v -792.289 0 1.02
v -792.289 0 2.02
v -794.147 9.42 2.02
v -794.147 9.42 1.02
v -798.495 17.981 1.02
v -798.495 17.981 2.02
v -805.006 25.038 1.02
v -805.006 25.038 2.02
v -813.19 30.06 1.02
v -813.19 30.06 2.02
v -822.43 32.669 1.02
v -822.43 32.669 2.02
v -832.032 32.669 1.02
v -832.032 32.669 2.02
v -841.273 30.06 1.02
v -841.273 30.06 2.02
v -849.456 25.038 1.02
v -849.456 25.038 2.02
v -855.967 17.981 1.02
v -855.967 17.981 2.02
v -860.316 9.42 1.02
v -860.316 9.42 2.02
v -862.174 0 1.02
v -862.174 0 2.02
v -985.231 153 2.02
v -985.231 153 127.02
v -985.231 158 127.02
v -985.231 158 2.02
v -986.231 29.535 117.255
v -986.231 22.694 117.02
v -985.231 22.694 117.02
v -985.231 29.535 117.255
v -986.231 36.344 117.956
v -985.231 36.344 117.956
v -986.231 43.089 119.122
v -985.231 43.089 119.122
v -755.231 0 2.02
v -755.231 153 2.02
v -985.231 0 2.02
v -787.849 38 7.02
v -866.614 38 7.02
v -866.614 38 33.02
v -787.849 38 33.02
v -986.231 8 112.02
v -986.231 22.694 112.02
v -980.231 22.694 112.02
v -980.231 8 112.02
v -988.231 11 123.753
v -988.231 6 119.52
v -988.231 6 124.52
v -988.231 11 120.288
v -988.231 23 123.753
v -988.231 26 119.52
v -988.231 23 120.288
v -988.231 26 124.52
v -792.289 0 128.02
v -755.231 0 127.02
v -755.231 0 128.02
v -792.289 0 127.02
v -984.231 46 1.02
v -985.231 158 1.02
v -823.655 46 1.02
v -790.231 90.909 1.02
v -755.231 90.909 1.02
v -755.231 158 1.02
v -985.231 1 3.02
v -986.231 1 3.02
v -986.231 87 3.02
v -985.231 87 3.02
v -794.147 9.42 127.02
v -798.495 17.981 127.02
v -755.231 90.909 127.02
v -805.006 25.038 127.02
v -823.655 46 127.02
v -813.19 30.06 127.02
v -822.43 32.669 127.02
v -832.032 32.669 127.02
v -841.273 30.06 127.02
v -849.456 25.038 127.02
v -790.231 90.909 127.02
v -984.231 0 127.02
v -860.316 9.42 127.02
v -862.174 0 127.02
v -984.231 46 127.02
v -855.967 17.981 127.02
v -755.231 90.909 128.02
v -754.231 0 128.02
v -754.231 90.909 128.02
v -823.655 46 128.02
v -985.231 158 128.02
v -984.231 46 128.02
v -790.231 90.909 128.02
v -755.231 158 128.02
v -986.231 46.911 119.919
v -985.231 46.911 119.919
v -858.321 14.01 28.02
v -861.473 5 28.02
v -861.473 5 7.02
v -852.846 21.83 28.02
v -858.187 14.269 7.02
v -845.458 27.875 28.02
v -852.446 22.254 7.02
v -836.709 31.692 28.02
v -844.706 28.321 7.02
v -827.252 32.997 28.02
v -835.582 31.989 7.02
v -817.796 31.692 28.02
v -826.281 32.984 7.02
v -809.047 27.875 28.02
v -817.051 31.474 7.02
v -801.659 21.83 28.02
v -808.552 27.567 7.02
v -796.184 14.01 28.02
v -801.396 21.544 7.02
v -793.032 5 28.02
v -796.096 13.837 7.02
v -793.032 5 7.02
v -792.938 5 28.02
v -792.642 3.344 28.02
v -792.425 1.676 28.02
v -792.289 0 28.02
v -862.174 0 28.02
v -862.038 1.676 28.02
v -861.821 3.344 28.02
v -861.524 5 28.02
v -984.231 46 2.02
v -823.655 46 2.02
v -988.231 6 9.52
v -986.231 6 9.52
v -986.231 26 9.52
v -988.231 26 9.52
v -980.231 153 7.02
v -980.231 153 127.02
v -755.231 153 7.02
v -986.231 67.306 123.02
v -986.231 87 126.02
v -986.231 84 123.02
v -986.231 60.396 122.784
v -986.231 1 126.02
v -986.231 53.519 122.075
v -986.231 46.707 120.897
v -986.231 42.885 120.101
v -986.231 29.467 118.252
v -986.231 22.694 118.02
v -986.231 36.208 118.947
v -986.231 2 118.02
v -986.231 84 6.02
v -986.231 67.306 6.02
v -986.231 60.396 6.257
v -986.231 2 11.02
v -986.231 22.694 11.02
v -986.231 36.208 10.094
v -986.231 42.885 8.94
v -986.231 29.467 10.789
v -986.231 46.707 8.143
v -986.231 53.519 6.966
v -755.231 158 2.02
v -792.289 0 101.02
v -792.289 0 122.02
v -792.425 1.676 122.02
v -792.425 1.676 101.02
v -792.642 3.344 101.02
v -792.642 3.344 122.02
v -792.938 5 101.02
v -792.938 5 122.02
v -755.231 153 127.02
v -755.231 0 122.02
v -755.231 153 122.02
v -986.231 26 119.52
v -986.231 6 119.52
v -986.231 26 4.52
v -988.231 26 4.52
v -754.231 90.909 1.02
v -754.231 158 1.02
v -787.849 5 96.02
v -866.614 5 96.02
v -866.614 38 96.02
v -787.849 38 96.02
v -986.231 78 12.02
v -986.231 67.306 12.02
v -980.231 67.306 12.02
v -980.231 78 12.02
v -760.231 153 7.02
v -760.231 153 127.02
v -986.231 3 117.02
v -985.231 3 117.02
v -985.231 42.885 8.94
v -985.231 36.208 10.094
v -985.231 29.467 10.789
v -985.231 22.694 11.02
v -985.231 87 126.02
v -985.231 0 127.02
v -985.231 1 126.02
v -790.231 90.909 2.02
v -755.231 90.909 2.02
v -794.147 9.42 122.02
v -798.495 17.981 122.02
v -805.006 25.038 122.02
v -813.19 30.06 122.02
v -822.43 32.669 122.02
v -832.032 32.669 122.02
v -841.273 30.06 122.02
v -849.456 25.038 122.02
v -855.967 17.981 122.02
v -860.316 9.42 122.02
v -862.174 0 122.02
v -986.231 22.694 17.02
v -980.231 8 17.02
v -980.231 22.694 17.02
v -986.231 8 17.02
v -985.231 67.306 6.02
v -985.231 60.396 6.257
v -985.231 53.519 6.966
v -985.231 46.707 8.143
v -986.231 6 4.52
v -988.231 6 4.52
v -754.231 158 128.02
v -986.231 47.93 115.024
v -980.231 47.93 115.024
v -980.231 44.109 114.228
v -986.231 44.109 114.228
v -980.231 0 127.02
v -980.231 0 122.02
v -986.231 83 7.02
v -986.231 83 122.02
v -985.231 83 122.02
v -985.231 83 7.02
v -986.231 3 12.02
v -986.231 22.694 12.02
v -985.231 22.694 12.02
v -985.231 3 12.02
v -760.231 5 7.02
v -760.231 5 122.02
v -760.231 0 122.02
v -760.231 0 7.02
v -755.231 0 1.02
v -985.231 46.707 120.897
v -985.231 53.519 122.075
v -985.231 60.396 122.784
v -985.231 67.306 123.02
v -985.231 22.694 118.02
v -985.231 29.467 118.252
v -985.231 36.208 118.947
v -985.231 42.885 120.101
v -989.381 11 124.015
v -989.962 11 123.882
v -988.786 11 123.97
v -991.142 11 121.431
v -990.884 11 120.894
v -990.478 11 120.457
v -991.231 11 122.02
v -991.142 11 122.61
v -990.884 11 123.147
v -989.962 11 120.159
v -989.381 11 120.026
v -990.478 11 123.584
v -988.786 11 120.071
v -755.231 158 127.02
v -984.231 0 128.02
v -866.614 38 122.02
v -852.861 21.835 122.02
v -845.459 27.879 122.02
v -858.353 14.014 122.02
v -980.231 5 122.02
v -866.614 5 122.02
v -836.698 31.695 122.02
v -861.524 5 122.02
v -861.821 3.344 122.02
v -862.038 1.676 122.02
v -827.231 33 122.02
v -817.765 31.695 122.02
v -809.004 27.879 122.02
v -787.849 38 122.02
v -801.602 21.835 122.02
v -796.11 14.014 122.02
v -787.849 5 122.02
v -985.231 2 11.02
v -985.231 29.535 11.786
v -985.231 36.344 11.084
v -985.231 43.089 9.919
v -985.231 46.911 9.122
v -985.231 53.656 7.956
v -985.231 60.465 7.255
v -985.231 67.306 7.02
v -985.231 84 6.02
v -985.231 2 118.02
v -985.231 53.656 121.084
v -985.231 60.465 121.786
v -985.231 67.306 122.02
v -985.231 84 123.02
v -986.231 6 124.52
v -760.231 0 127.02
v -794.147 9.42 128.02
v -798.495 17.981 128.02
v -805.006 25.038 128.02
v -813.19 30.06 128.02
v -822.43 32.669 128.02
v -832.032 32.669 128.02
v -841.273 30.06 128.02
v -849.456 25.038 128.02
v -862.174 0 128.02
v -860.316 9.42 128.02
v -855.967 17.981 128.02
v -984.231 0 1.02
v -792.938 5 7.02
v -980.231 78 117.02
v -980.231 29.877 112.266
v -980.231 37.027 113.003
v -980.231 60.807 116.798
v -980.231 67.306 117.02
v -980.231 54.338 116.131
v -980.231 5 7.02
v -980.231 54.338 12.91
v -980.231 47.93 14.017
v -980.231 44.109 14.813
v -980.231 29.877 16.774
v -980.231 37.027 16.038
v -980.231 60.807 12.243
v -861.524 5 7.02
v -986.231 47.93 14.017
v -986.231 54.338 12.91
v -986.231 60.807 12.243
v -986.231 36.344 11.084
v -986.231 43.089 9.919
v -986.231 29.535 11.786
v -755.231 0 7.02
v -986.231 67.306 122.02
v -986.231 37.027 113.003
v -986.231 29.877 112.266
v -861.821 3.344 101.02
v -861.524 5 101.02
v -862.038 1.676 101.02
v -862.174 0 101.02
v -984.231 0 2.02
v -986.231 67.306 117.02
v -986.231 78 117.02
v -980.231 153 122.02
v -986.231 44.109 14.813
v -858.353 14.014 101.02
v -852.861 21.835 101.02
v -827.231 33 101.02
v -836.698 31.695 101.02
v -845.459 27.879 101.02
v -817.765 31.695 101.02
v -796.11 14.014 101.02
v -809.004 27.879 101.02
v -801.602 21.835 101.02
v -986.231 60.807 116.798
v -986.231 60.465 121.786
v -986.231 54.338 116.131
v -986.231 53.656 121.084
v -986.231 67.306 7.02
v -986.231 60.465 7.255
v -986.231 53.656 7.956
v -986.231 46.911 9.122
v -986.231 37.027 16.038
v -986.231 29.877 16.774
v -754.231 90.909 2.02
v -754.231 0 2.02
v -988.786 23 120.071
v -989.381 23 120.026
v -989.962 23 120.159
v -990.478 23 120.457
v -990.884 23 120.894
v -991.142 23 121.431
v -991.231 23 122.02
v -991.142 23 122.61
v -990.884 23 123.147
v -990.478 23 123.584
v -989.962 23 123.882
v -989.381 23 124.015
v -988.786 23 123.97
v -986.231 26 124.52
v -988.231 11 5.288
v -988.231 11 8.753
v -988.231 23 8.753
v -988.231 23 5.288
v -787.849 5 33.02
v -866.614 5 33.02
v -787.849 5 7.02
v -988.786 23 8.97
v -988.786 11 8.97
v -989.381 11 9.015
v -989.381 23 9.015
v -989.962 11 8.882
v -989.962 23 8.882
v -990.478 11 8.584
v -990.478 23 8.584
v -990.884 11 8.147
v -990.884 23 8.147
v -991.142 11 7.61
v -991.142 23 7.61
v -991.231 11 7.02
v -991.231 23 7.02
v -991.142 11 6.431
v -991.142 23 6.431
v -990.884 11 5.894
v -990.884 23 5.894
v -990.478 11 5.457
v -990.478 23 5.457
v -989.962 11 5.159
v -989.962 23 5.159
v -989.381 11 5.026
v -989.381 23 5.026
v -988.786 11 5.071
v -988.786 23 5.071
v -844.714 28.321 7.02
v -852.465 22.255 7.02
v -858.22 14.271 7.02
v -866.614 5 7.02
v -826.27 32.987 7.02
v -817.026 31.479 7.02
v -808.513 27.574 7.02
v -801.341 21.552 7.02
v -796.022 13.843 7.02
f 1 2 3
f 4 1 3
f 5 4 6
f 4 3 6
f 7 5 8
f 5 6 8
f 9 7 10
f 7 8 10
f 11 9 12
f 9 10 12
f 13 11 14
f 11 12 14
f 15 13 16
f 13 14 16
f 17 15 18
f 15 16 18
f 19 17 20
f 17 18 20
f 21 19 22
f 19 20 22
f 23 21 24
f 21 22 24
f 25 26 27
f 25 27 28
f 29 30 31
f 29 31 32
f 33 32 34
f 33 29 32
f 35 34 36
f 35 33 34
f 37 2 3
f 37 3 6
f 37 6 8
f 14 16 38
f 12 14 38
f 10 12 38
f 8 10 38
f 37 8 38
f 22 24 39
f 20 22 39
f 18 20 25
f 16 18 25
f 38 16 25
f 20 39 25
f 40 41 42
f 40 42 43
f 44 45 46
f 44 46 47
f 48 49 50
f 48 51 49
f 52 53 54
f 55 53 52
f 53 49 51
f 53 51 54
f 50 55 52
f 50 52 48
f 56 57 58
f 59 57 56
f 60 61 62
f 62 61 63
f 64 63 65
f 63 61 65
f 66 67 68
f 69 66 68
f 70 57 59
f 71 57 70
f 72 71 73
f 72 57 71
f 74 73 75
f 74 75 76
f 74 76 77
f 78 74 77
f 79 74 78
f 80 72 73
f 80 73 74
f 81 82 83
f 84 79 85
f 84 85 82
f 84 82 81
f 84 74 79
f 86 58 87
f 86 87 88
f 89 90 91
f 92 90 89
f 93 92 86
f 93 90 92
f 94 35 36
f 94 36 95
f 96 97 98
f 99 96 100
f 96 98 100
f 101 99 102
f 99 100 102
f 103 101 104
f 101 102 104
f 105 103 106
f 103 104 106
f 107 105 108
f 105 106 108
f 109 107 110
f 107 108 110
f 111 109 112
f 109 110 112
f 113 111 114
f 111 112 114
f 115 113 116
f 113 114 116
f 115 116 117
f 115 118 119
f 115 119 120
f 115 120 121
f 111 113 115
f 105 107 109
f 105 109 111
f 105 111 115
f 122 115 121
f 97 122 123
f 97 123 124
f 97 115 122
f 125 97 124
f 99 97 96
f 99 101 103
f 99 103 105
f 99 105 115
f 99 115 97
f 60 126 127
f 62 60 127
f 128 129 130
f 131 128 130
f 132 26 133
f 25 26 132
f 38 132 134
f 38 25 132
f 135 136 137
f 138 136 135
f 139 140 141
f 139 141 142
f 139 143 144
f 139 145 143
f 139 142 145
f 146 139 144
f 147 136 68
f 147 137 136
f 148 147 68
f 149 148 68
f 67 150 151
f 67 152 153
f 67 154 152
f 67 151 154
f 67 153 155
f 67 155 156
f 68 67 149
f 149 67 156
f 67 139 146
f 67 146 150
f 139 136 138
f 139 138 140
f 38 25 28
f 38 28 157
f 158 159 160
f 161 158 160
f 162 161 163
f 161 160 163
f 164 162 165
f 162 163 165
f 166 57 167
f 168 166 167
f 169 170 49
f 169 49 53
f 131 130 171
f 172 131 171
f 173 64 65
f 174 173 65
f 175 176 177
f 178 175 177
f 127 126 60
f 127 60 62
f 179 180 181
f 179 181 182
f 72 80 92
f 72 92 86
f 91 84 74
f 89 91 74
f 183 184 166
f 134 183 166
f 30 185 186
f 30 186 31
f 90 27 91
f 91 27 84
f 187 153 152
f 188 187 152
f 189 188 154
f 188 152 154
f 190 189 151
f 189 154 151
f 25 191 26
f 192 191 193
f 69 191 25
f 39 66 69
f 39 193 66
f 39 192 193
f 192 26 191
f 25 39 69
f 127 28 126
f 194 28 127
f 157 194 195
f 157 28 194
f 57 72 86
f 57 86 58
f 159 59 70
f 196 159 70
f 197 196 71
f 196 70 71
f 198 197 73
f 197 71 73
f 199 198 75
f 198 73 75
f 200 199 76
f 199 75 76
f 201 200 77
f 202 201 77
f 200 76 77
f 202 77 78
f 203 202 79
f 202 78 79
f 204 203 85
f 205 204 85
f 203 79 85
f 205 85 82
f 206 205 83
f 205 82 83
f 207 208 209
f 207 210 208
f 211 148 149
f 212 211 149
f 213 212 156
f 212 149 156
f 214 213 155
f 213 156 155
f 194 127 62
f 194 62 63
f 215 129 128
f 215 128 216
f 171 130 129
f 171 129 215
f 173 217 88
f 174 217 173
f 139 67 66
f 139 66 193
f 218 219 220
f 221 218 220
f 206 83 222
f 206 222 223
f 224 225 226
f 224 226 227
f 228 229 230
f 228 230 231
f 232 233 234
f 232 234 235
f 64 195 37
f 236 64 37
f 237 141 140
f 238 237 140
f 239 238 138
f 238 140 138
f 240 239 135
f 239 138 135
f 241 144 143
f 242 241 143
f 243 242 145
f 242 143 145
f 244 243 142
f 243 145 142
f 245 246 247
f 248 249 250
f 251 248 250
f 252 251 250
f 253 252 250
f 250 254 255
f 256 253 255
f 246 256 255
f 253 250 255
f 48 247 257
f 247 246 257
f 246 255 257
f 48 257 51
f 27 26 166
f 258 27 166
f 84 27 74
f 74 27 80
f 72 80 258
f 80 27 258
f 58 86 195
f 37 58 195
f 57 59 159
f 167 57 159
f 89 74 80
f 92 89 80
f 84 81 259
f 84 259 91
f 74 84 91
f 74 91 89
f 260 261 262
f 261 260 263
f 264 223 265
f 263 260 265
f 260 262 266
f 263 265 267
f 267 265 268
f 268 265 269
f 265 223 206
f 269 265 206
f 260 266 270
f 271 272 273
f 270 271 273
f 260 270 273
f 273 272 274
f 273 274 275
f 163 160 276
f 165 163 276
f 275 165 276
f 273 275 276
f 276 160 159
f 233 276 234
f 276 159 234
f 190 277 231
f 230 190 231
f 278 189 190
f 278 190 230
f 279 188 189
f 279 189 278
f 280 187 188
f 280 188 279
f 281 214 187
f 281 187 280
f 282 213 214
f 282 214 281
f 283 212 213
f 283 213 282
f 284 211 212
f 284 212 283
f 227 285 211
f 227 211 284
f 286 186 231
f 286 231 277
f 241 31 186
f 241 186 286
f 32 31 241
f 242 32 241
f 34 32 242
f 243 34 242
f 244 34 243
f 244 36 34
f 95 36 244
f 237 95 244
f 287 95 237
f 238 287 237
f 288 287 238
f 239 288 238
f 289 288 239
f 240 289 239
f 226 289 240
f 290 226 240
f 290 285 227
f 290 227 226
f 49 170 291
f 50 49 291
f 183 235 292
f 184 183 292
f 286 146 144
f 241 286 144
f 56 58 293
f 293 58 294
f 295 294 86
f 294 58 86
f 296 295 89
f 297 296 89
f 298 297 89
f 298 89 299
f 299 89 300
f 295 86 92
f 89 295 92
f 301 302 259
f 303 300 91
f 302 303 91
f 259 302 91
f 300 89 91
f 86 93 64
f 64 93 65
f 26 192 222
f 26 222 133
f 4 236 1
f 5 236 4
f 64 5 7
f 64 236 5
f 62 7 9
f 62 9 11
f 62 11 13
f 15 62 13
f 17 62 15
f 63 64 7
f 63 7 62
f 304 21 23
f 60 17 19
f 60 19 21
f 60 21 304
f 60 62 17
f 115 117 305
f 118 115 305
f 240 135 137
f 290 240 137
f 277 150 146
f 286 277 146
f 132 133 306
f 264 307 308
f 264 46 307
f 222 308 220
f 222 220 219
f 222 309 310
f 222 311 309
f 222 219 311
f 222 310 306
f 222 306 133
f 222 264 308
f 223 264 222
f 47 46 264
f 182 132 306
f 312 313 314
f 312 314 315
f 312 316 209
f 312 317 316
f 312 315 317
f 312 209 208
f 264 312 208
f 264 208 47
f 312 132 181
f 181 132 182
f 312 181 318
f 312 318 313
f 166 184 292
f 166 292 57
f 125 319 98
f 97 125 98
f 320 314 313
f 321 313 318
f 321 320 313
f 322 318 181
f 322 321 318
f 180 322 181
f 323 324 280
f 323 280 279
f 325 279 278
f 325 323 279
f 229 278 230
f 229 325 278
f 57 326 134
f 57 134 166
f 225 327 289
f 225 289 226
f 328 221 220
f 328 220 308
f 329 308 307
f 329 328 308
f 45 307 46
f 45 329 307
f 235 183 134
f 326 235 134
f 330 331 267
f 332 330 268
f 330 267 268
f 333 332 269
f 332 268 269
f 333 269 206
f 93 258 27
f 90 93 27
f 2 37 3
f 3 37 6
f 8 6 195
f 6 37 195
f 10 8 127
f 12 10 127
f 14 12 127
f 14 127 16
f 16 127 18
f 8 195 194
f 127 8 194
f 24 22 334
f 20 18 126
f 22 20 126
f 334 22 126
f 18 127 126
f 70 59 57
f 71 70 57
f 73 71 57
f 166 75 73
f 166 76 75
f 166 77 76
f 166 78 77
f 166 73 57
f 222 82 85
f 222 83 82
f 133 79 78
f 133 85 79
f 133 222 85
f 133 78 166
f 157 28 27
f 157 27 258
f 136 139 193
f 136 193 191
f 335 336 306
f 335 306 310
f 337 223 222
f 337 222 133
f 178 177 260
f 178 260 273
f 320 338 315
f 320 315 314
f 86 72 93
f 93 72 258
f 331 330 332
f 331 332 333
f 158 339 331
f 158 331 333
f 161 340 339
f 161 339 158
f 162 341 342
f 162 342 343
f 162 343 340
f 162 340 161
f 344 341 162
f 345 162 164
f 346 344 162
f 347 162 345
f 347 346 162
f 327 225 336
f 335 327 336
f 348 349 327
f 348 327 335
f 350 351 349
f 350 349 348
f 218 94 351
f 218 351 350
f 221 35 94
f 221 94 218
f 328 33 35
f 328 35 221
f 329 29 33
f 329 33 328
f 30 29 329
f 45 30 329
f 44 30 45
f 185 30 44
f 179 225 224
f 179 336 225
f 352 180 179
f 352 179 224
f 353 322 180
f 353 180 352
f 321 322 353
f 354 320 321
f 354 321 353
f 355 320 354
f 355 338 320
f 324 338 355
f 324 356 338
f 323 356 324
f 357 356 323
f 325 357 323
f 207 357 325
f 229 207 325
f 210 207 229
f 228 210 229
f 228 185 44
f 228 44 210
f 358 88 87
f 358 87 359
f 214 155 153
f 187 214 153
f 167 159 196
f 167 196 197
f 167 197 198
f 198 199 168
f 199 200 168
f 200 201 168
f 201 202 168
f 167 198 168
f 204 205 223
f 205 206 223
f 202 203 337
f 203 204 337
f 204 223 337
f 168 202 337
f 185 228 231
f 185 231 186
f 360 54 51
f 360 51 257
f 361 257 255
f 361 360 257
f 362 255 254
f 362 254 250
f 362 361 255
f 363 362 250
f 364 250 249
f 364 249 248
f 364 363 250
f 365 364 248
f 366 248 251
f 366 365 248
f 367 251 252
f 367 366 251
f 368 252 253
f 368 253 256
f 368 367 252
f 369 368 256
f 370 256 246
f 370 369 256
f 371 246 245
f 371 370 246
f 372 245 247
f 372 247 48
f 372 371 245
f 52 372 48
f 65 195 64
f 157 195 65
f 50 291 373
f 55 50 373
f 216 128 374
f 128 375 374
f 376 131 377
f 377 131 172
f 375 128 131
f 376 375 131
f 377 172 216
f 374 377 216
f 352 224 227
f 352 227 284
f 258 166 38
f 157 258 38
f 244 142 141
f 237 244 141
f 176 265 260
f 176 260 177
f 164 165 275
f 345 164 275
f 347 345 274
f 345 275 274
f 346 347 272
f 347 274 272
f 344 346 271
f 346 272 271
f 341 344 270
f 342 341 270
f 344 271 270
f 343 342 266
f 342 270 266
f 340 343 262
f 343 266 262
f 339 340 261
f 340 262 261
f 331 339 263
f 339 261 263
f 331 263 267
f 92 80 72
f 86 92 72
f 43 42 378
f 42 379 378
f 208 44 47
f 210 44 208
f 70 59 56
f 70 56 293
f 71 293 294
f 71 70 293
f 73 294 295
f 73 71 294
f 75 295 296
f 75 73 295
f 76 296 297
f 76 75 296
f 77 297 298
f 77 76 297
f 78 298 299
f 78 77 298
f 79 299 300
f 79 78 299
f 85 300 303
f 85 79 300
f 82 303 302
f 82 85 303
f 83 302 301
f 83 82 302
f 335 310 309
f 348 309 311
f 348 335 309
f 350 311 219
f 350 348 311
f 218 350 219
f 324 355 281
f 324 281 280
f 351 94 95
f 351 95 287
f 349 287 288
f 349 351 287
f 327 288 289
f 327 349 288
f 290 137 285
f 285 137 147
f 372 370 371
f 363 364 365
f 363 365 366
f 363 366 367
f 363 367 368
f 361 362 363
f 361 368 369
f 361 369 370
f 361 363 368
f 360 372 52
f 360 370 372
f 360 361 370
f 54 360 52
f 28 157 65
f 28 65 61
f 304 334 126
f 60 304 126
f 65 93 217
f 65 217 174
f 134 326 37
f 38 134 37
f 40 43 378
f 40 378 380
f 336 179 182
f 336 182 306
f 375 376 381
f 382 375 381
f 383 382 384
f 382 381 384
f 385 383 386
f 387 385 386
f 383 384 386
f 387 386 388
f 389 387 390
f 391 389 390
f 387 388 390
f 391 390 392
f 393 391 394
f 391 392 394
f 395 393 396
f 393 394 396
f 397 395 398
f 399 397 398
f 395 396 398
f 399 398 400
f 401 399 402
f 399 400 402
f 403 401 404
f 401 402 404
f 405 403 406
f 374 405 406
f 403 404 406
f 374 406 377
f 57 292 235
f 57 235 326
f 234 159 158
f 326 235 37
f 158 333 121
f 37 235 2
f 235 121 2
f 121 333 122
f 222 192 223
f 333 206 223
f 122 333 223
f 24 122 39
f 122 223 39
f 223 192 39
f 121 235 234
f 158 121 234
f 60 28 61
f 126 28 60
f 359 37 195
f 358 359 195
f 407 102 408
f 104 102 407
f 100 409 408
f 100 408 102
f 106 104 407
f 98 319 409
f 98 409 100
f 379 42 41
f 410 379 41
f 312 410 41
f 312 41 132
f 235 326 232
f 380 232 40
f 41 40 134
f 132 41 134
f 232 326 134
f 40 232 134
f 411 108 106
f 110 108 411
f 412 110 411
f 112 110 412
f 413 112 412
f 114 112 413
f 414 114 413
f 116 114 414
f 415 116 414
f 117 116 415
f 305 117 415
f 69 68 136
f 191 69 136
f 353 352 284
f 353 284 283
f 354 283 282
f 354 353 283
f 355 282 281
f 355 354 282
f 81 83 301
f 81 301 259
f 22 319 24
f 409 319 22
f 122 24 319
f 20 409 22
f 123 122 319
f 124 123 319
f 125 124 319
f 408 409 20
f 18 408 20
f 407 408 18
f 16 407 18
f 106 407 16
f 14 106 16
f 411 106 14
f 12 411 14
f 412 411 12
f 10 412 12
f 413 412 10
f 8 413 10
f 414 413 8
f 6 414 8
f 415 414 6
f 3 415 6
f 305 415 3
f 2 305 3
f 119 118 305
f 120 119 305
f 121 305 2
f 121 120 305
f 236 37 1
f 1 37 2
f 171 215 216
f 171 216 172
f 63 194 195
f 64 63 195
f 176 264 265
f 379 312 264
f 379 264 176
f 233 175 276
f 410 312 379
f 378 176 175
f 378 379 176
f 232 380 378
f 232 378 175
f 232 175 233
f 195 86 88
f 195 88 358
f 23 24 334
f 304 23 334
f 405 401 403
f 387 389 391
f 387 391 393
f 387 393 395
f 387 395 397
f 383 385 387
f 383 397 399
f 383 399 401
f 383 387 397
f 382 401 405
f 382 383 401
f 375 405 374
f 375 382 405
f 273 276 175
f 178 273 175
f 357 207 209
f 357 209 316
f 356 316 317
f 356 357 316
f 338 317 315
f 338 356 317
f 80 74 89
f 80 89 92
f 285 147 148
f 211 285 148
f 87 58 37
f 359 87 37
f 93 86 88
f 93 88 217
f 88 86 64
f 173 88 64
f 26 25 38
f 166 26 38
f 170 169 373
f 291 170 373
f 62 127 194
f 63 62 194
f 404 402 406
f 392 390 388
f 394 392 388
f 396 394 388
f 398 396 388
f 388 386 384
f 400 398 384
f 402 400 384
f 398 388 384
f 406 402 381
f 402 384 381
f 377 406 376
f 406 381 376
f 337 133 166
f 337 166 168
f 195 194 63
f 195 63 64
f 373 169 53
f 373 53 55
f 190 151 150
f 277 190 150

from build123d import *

# Parameters (mm, degrees)
SKETCH_1_W                = 229
SKETCH_1_H                = 125
EXTRUDE_1_DEPTH           = 88
SKETCH_4_W                = 125
SKETCH_4_H                = 88
SKETCH_4_W_2              = 123
SKETCH_4_H_2              = 86
CUT_EXTRUDE_3_DEPTH       = 1
SKETCH_5_W                = 125
SKETCH_5_H                = 88
EXTRUDE_2_DEPTH           = 1
SKETCH_11_W               = 5
SKETCH_11_H               = 20
EXTRUDE_3_DEPTH           = 2
SKETCH_12_R               = 2
EXTRUDE_4_DEPTH           = 12
SKETCH_13_R               = 35
CUT_EXTRUDE_7_DEPTH       = 26
CUT_EXTRUDE_START         = -26
SKETCH_14_R               = 35
CUT_EXTRUDE_8_DEPTH       = 26
SKETCH_16_W               = 229
SKETCH_16_H               = 125
EXTRUDE_6_DEPTH           = 70
SHELL_START               = -980.231317195
SHELL_1_OUTLINE_W         = 148
SHELL_1_OUTLINE_H         = 115
SHELL_1_DEPTH             = 113.617262665
SHELL_START_2             = -787.84857986
SHELL_1_2_OUTLINE_W       = 148
SHELL_1_2_OUTLINE_H       = 115
SHELL_1_2_DEPTH           = 31.617262665
SHELL_1_3_OUTLINE_W       = 3
SHELL_1_3_OUTLINE_H       = 63
SHELL_1_3_DEPTH           = 224
SHELL_START_3             = -981.231317195
SHELL_1_4_DEPTH           = 1
SHELL_START_4             = 7.020467364
SHELL_1_5_DEPTH           = 115
SHELL_START_5             = 33.020467364
SHELL_1_6_DEPTH           = 63
CUT_EXTRUDE_START_2       = -70
CUT_EXTRUDE_9_DEPTH       = 70
SKETCH_20_W               = 125
SKETCH_20_H               = 158
SKETCH_20_W_2             = 115
SKETCH_20_H_2             = 148
EXTRUDE_7_DEPTH           = 1
CUT_EXTRUDE_START_3       = -5
CUT_EXTRUDE_14_DEPTH      = 5
EXTRUDE_8_DEPTH           = 5
SKETCH_26_W               = 230
SKETCH_26_H               = 125
CUT_EXTRUDE_15_DEPTH      = 5
SKETCH_27_W               = 230
SKETCH_27_H               = 125
EXTRUDE_9_DEPTH           = 5
SKETCH_28_W               = 5
SKETCH_28_H               = 115
EXTRUDE_10_DEPTH          = 148
EXTRUDE_11_DEPTH          = 1
EXTRUDE_12_DEPTH          = 1
SKETCH_32_W               = 127
SKETCH_32_H               = 67.090624259
EXTRUDE_13_DEPTH          = 1
SKETCH_33_W               = 126
SKETCH_33_H               = 90.909375741
EXTRUDE_14_DEPTH          = 1
CUT_EXTRUDE_16_DEPTH      = 40
CUT_EXTRUDE_16_DEPTH_BACK = 10
SKETCH_34_W               = 225
SKETCH_34_H               = 5
SKETCH_35_W               = 220
SKETCH_35_H               = 153
EXTRUDE_16_DEPTH          = 5
SKETCH_36_W               = 5
SKETCH_36_H               = 153
EXTRUDE_17_DEPTH          = 5
CUT_EXTRUDE_17_DEPTH      = 5
SKETCH_39_W               = 115
SKETCH_39_H               = 5
CUT_EXTRUDE_18_DEPTH      = 5
SKETCH_40_W               = 5
SKETCH_40_H               = 120
EXTRUDE_19_DEPTH          = 153
SKETCH_45_W               = 78.76547467
SKETCH_45_H               = 26
EXTRUDE_21_DEPTH          = 33
CUT_EXTRUDE_20_DEPTH      = 21
SKETCH_48_R               = 34.912032086
CUT_EXTRUDE_21_DEPTH      = 21


with BuildPart() as part:
    # 스케치1 → 보스-돌출1 (new body)
    with BuildSketch(Plane(origin=(0, 0, 0), x_dir=(1, 0, 0), z_dir=(0, 1, 0))):
        with Locations((-871.731317195, -64.520467364)):
            Rectangle(SKETCH_1_W, SKETCH_1_H)
    extrude(amount=EXTRUDE_1_DEPTH)

    # 스케치4 → 컷-돌출3 (cut)
    # profile 1 of 2: a face of its own
    with BuildSketch(Plane.ZY.offset(986.231317195)):
        with Locations((64.520467364, 44)):
            Rectangle(SKETCH_4_W, SKETCH_4_H)
        with Locations((64.520467364, 44)):
            Rectangle(SKETCH_4_W_2, SKETCH_4_H_2, mode=Mode.SUBTRACT)
    # profile 2 of 2: a face of its own
    with BuildSketch(Plane.ZY.offset(986.231317195)):
        with BuildLine():
            Line((6.020467364, 84), (6.020467364, 67.306026885))
            ThreePointArc((6.020467364, 67.306026885), (6.552613646, 56.95178287), (8.143444971, 46.70664722))
            Line((8.143444971, 46.70664722), (8.939528918, 42.885444272))
            ThreePointArc((8.939528918, 42.885444272), (10.498858633, 32.843182595), (11.020467364, 22.693973115))
            Line((11.020467364, 22.693973115), (11.020467364, 2))
            Line((11.020467364, 2), (118.020467364, 2))
            Line((118.020467364, 2), (118.020467364, 22.693973115))
            ThreePointArc((118.020467364, 22.693973115), (118.542076095, 32.843182595), (120.10140581, 42.885444272))
            Line((120.10140581, 42.885444272), (120.897489758, 46.70664722))
            ThreePointArc((120.897489758, 46.70664722), (122.488321083, 56.95178287), (123.020467364, 67.306026885))
            Line((123.020467364, 67.306026885), (123.020467364, 84))
            Line((123.020467364, 84), (6.020467364, 84))
        make_face()
        with BuildLine():
            Line((12.020467364, 22.693973115), (12.020467364, 3))
            Line((12.020467364, 3), (117.020467364, 3))
            Line((117.020467364, 3), (117.020467364, 22.693973115))
            ThreePointArc((117.020467364, 22.693973115), (117.547344871, 32.945699863), (119.122425391, 43.089398526))
            Line((119.122425391, 43.089398526), (119.918509338, 46.910601474))
            ThreePointArc((119.918509338, 46.910601474), (121.493589858, 57.054300137), (122.020467364, 67.306026885))
            Line((122.020467364, 67.306026885), (122.020467364, 83))
            Line((122.020467364, 83), (7.020467364, 83))
            Line((7.020467364, 83), (7.020467364, 67.306026885))
            ThreePointArc((7.020467364, 67.306026885), (7.547344871, 57.054300137), (9.122425391, 46.910601474))
            Line((9.122425391, 46.910601474), (9.918509338, 43.089398526))
            ThreePointArc((9.918509338, 43.089398526), (11.493589858, 32.945699863), (12.020467364, 22.693973115))
        make_face(mode=Mode.SUBTRACT)
    extrude(amount=-CUT_EXTRUDE_3_DEPTH, mode=Mode.SUBTRACT)

    # 스케치5 → 보스-돌출2 (add)
    with BuildSketch(Plane(origin=(-757.231317195, 0, 0), x_dir=(0, 0, -1), z_dir=(1, 0, 0))):
        with Locations((-64.520467364, 44)):
            Rectangle(SKETCH_5_W, SKETCH_5_H)
    extrude(amount=EXTRUDE_2_DEPTH)

    # 스케치13 → 컷-돌출7 (cut)
    with BuildSketch(Plane.XY.offset(127.020467364)):
        with Locations((-827.231317195, -2)):
            Circle(SKETCH_13_R)
    extrude(amount=-CUT_EXTRUDE_7_DEPTH, mode=Mode.SUBTRACT)

    # 스케치14 → 컷-돌출8 (cut)
    with BuildSketch(Plane(origin=(0, 0, 2.020467364), x_dir=(-1, 0, 0), z_dir=(0, 0, -1)).offset(CUT_EXTRUDE_START)):
        with Locations((827.231317195, -2)):
            Circle(SKETCH_14_R)
    extrude(amount=CUT_EXTRUDE_8_DEPTH, mode=Mode.SUBTRACT)

    # 스케치16 → 보스-돌출6 (add)
    with BuildSketch(Plane(origin=(0, 88, 0), x_dir=(1, 0, 0), z_dir=(0, 1, 0))):
        with Locations((-870.731317195, -64.520467364)):
            Rectangle(SKETCH_16_W, SKETCH_16_H)
    extrude(amount=EXTRUDE_6_DEPTH)

    # 쉘1: read off the stored shape, not the designer's step
    # 쉘1 outline → 쉘1 (cut)
    with BuildSketch(Plane.YZ.offset(SHELL_START)):
        with Locations((79, 64.520467364)):
            Rectangle(SHELL_1_OUTLINE_W, SHELL_1_OUTLINE_H)
    extrude(amount=SHELL_1_DEPTH, mode=Mode.SUBTRACT)

    # Shell 1 2 outline → Shell 1 2 (cut)
    with BuildSketch(Plane.YZ.offset(SHELL_START_2)):
        with Locations((79, 64.520467364)):
            Rectangle(SHELL_1_2_OUTLINE_W, SHELL_1_2_OUTLINE_H)
    extrude(amount=SHELL_1_2_DEPTH, mode=Mode.SUBTRACT)

    # Shell 1 3 outline → Shell 1 3 (cut)
    with BuildSketch(Plane.YZ.offset(SHELL_START)):
        with Locations((6.5, 64.520467364)):
            Rectangle(SHELL_1_3_OUTLINE_W, SHELL_1_3_OUTLINE_H)
    extrude(amount=SHELL_1_3_DEPTH, mode=Mode.SUBTRACT)

    # Shell 1 4 outline → Shell 1 4 (cut)
    with BuildSketch(Plane.YZ.offset(SHELL_START_3)):
        with BuildLine():
            Line((8, 96.020467364), (8, 33.020467364))
            Line((8, 33.020467364), (8, 17.020467364))
            Line((8, 17.020467364), (22.693973115, 17.020467364))
            ThreePointArc((22.693973115, 17.020467364), (33.4582862, 16.467245983), (44.109169797, 14.813411437))
            Line((44.109169797, 14.813411437), (47.930372745, 14.017327489))
            ThreePointArc((47.930372745, 14.017327489), (57.566886475, 12.521000995), (67.306026885, 12.020467364))
            Line((67.306026885, 12.020467364), (78, 12.020467364))
            Line((78, 12.020467364), (78, 117.020467364))
            Line((78, 117.020467364), (67.306026885, 117.020467364))
            ThreePointArc((67.306026885, 117.020467364), (57.566886475, 116.519933734), (47.930372745, 115.023607239))
            Line((47.930372745, 115.023607239), (44.109169797, 114.227523292))
            ThreePointArc((44.109169797, 114.227523292), (33.4582862, 112.573688746), (22.693973115, 112.020467364))
            Line((22.693973115, 112.020467364), (8, 112.020467364))
            Line((8, 112.020467364), (8, 96.020467364))
        make_face()
    extrude(amount=SHELL_1_4_DEPTH, mode=Mode.SUBTRACT)

    # Shell 1 5 outline → Shell 1 5 (cut)
    with BuildSketch(Plane.XY.offset(SHELL_START_4)):
        with BuildLine():
            Line((-787.84857986, 5), (-787.84857986, 153))
            Line((-787.84857986, 153), (-866.61405453, 153))
            Line((-866.61405453, 153), (-866.61405453, 5))
            ThreePointArc((-866.61405453, 5), (-827.231317195, 38), (-787.84857986, 5))
        make_face()
    extrude(amount=SHELL_1_5_DEPTH, mode=Mode.SUBTRACT)

    # Shell 1 6 outline → Shell 1 6 (cut)
    with BuildSketch(Plane.XY.offset(SHELL_START_5)):
        with BuildLine():
            Line((-865.961150657, 8), (-788.501483733, 8))
            ThreePointArc((-788.501483733, 8), (-827.231317195, 38), (-865.961150657, 8))
        make_face()
    extrude(amount=SHELL_1_6_DEPTH, mode=Mode.SUBTRACT)

    # 스케치18 → 컷-돌출9 (cut)
    with BuildSketch(Plane(origin=(-981.231317195, 0, 0), x_dir=(0, 0, -1), z_dir=(1, 0, 0)).offset(CUT_EXTRUDE_START_2)):
        with BuildLine():
            Line((-17.020467364, 8), (-17.020467364, 22.693973115))
            ThreePointArc((-17.020467364, 22.693973115), (-16.467245983, 33.4582862), (-14.813411437, 44.109169797))
            Line((-14.813411437, 44.109169797), (-14.017327489, 47.930372745))
            ThreePointArc((-14.017327489, 47.930372745), (-12.521000995, 57.566886475), (-12.020467364, 67.306026885))
            Line((-12.020467364, 67.306026885), (-12.020467364, 78))
            Line((-12.020467364, 78), (-117.020467364, 78))
            Line((-117.020467364, 78), (-117.020467364, 67.306026885))
            ThreePointArc((-117.020467364, 67.306026885), (-116.519933734, 57.566886475), (-115.023607239, 47.930372745))
            Line((-115.023607239, 47.930372745), (-114.227523292, 44.109169797))
            ThreePointArc((-114.227523292, 44.109169797), (-112.573688746, 33.4582862), (-112.020467364, 22.693973115))
            Line((-112.020467364, 22.693973115), (-112.020467364, 8))
            Line((-112.020467364, 8), (-17.020467364, 8))
        make_face()
    extrude(amount=CUT_EXTRUDE_9_DEPTH, mode=Mode.SUBTRACT)

    # 스케치20 → 보스-돌출7 (add)
    with BuildSketch(Plane(origin=(-756.231317195, 0, 0), x_dir=(0, 0, -1), z_dir=(1, 0, 0))):
        with Locations((-64.520467364, 79)):
            Rectangle(SKETCH_20_W, SKETCH_20_H)
        with Locations((-64.520467364, 79)):
            Rectangle(SKETCH_20_W_2, SKETCH_20_H_2, mode=Mode.SUBTRACT)
    extrude(amount=EXTRUDE_7_DEPTH)

    # 스케치24 → 컷-돌출14 (cut)
    with BuildSketch(Plane.XY.offset(127.020467364).offset(CUT_EXTRUDE_START_3)):
        with BuildLine():
            Line((-755.231317195, 153), (-980.231317195, 153))
            Line((-980.231317195, 153), (-980.231317195, 5))
            Line((-980.231317195, 5), (-866.61405453, 5))
            ThreePointArc((-866.61405453, 5), (-827.231317195, 38), (-787.84857986, 5))
            Line((-787.84857986, 5), (-755.231317195, 5))
            Line((-755.231317195, 5), (-755.231317195, 153))
        make_face()
    extrude(amount=CUT_EXTRUDE_14_DEPTH, mode=Mode.SUBTRACT)

    # 스케치26 → 컷-돌출15 (cut)
    with BuildSketch(Plane(origin=(0, 158, 0), x_dir=(1, 0, 0), z_dir=(0, 1, 0))):
        with Locations((-870.231317195, -64.520467364)):
            Rectangle(SKETCH_26_W, SKETCH_26_H)
    extrude(amount=-CUT_EXTRUDE_15_DEPTH, mode=Mode.SUBTRACT)

    # 스케치34 → 컷-돌출16 (cut, two sides: drawn at the far end of the back side and taken through both)
    with BuildSketch(Plane(origin=(0, 5, 0), x_dir=(1, 0, 0), z_dir=(0, 1, 0)).offset(-CUT_EXTRUDE_16_DEPTH_BACK)):
        with Locations((-867.731317195, -124.520467364)):
            Rectangle(SKETCH_34_W, SKETCH_34_H)
    extrude(amount=CUT_EXTRUDE_16_DEPTH + CUT_EXTRUDE_16_DEPTH_BACK, mode=Mode.SUBTRACT)

    # 스케치39 → 컷-돌출18 (cut)
    with BuildSketch(Plane(origin=(-755.231317195, 0, 0), x_dir=(0, 0, -1), z_dir=(1, 0, 0))):
        with Locations((-64.520467364, 2.5)):
            Rectangle(SKETCH_39_W, SKETCH_39_H)
    extrude(amount=-CUT_EXTRUDE_18_DEPTH, mode=Mode.SUBTRACT)

    # 스케치45 → 보스-돌출21 (add)
    with BuildSketch(Plane(origin=(0, 5, 0), x_dir=(1, 0, 0), z_dir=(0, 1, 0))):
        with Locations((-827.231317195, -20.020467364)):
            Rectangle(SKETCH_45_W, SKETCH_45_H)
        with Locations((-827.231317195, -109.020467364)):
            Rectangle(SKETCH_45_W, SKETCH_45_H)
    extrude(amount=EXTRUDE_21_DEPTH)

    # 스케치47 → 컷-돌출20 (cut)
    with BuildSketch(Plane.XY.offset(122.020467364)):
        with BuildLine():
            Line((-862.174127614, 0), (-792.288506775, 0))
            ThreePointArc((-792.288506775, 0), (-827.231317195, 33), (-862.174127614, 0))
        make_face()
    extrude(amount=-CUT_EXTRUDE_20_DEPTH, mode=Mode.SUBTRACT)

    # 스케치48 → 컷-돌출21 (cut)
    with BuildSketch(Plane(origin=(0, 0, 7.020467364), x_dir=(-1, 0, 0), z_dir=(0, 0, -1))):
        with Locations((827.252311569, -1.914574066)):
            Circle(SKETCH_48_R)
    extrude(amount=-CUT_EXTRUDE_21_DEPTH, mode=Mode.SUBTRACT)


with BuildPart() as body_2:
    # 스케치11 → 보스-돌출3 (new body)
    with BuildSketch(Plane.ZY.offset(986.231317195)):
        with Locations((122.020467364, 16)):
            Rectangle(SKETCH_11_W, SKETCH_11_H)
    extrude(amount=EXTRUDE_3_DEPTH)

    # 스케치12 → 보스-돌출4 (add)
    with BuildSketch(Plane(origin=(0, 23, 0), x_dir=(1, 0, 0), z_dir=(0, 1, 0))):
        with Locations((-989.231317195, -122.020467364)):
            Circle(SKETCH_12_R)
    extrude(amount=-EXTRUDE_4_DEPTH)


with BuildPart() as body_3:
    # 대칭 복사1: mirrored copy
    add(body_2.part.mirror(Plane.XY.offset(64.520467364)))


with BuildPart() as body_4:
    # 스케치25 → 보스-돌출8 (new body)
    with BuildSketch(Plane.XY.offset(127.020467364)):
        with BuildLine():
            Line((-980.231317195, 153), (-755.231317195, 153))
            Line((-755.231317195, 153), (-755.231317195, 5))
            Line((-755.231317195, 5), (-787.616277727, 5))
            ThreePointArc((-787.616277727, 5), (-826.999015062, 38), (-866.381752397, 5))
            Line((-866.381752397, 5), (-980.231317195, 5))
            Line((-980.231317195, 5), (-980.231317195, 153))
        make_face()
    extrude(amount=-EXTRUDE_8_DEPTH)


with BuildPart() as body_5:
    # 스케치27 → 보스-돌출9 (new body)
    with BuildSketch(Plane(origin=(0, 153, 0), x_dir=(1, 0, 0), z_dir=(0, 1, 0))):
        with Locations((-870.231317195, -64.520467364)):
            Rectangle(SKETCH_27_W, SKETCH_27_H)
    extrude(amount=EXTRUDE_9_DEPTH)


with BuildPart() as body_6:
    # 스케치28 → 보스-돌출10 (new body)
    with BuildSketch(Plane(origin=(0, 5, 0), x_dir=(1, 0, 0), z_dir=(0, 1, 0))):
        with Locations((-757.731317195, -64.520467364)):
            Rectangle(SKETCH_28_W, SKETCH_28_H)
    extrude(amount=EXTRUDE_10_DEPTH)


with BuildPart() as body_7:
    # 스케치29 → 보스-돌출11 (new body)
    with BuildSketch(Plane(origin=(0, 0, 2.020467364), x_dir=(-1, 0, 0), z_dir=(0, 0, -1))):
        with BuildLine():
            Line((984.231317195, 0), (984.231317195, 46))
            Line((984.231317195, 46), (823.655113572, 46))
            Line((823.655113572, 46), (790.231317195, 90.909375741))
            Line((790.231317195, 90.909375741), (755.231317195, 90.909375741))
            Line((755.231317195, 90.909375741), (755.231317195, 0))
            Line((755.231317195, 0), (792.288506775, 0))
            ThreePointArc((792.288506775, 0), (827.231317195, 33), (862.174127614, 0))
            Line((862.174127614, 0), (984.231317195, 0))
        make_face()
    extrude(amount=EXTRUDE_11_DEPTH)


with BuildPart() as body_8:
    # 스케치30 → 보스-돌출12 (new body)
    with BuildSketch(Plane(origin=(0, 0, 2.020467364), x_dir=(-1, 0, 0), z_dir=(0, 0, -1))):
        Polygon((755.231317195, 90.909375741), (755.231317195, 158), (985.231317195, 158), (984.231317195, 46), (823.655113572, 46), (790.231317195, 90.909375741), align=None)
    extrude(amount=EXTRUDE_12_DEPTH)


with BuildPart() as body_8_2:
    # 대칭 복사3: mirrored copy
    add(body_8.part.mirror(Plane.XY.offset(64.520467364)))


with BuildPart() as body_9:
    # Mirror 3 2: mirrored copy
    add(body_7.part.mirror(Plane.XY.offset(64.520467364)))


with BuildPart() as body_10:
    # 스케치32 → 보스-돌출13 (new body)
    with BuildSketch(Plane(origin=(-755.231317195, 0, 0), x_dir=(0, 0, -1), z_dir=(1, 0, 0))):
        with Locations((-64.520467364, 124.454687871)):
            Rectangle(SKETCH_32_W, SKETCH_32_H)
    extrude(amount=EXTRUDE_13_DEPTH)


with BuildPart() as body_11:
    # 스케치33 → 보스-돌출14 (new body)
    with BuildSketch(Plane(origin=(-755.231317195, 0, 0), x_dir=(0, 0, -1), z_dir=(1, 0, 0))):
        with Locations((-65.020467364, 45.454687871)):
            Rectangle(SKETCH_33_W, SKETCH_33_H)
    extrude(amount=EXTRUDE_14_DEPTH)


with BuildPart() as body_12:
    # 대칭 복사4: mirrored copy
    add(body_2.part.mirror(Plane.XY.offset(64.520467364)))


with BuildPart() as body_12_2:
    # 스케치35 → 보스-돌출16 (new body)
    with BuildSketch(Plane.XY.offset(122.020467364)):
        with Locations((-870.231317195, 76.5)):
            Rectangle(SKETCH_35_W, SKETCH_35_H)
    extrude(amount=EXTRUDE_16_DEPTH)

    # 스케치36 → 보스-돌출17 (add)
    with BuildSketch(Plane(origin=(-760.231317195, 0, 0), x_dir=(0, 0, -1), z_dir=(1, 0, 0))):
        with Locations((-124.520467364, 76.5)):
            Rectangle(SKETCH_36_W, SKETCH_36_H)
    extrude(amount=EXTRUDE_17_DEPTH)

    # 스케치37 → 컷-돌출17 (cut)
    with BuildSketch(Plane.XY.offset(127.020467364)):
        with BuildLine():
            Line((-862.174127614, 0), (-792.288506775, 0))
            ThreePointArc((-792.288506775, 0), (-827.231317195, 33), (-862.174127614, 0))
        make_face()
    extrude(amount=-CUT_EXTRUDE_17_DEPTH, mode=Mode.SUBTRACT)


with BuildPart() as body_12_3:
    # 스케치40 → 보스-돌출19 (new body)
    with BuildSketch(Plane.XZ):
        with Locations((-757.731317195, 67.020467364)):
            Rectangle(SKETCH_40_W, SKETCH_40_H)
    extrude(amount=-EXTRUDE_19_DEPTH)


solid = Compound([part.part, body_2.part, body_5.part, body_7.part, body_8.part, body_8_2.part, body_9.part, body_10.part, body_11.part, body_12.part, body_12_2.part, body_12_3.part])
